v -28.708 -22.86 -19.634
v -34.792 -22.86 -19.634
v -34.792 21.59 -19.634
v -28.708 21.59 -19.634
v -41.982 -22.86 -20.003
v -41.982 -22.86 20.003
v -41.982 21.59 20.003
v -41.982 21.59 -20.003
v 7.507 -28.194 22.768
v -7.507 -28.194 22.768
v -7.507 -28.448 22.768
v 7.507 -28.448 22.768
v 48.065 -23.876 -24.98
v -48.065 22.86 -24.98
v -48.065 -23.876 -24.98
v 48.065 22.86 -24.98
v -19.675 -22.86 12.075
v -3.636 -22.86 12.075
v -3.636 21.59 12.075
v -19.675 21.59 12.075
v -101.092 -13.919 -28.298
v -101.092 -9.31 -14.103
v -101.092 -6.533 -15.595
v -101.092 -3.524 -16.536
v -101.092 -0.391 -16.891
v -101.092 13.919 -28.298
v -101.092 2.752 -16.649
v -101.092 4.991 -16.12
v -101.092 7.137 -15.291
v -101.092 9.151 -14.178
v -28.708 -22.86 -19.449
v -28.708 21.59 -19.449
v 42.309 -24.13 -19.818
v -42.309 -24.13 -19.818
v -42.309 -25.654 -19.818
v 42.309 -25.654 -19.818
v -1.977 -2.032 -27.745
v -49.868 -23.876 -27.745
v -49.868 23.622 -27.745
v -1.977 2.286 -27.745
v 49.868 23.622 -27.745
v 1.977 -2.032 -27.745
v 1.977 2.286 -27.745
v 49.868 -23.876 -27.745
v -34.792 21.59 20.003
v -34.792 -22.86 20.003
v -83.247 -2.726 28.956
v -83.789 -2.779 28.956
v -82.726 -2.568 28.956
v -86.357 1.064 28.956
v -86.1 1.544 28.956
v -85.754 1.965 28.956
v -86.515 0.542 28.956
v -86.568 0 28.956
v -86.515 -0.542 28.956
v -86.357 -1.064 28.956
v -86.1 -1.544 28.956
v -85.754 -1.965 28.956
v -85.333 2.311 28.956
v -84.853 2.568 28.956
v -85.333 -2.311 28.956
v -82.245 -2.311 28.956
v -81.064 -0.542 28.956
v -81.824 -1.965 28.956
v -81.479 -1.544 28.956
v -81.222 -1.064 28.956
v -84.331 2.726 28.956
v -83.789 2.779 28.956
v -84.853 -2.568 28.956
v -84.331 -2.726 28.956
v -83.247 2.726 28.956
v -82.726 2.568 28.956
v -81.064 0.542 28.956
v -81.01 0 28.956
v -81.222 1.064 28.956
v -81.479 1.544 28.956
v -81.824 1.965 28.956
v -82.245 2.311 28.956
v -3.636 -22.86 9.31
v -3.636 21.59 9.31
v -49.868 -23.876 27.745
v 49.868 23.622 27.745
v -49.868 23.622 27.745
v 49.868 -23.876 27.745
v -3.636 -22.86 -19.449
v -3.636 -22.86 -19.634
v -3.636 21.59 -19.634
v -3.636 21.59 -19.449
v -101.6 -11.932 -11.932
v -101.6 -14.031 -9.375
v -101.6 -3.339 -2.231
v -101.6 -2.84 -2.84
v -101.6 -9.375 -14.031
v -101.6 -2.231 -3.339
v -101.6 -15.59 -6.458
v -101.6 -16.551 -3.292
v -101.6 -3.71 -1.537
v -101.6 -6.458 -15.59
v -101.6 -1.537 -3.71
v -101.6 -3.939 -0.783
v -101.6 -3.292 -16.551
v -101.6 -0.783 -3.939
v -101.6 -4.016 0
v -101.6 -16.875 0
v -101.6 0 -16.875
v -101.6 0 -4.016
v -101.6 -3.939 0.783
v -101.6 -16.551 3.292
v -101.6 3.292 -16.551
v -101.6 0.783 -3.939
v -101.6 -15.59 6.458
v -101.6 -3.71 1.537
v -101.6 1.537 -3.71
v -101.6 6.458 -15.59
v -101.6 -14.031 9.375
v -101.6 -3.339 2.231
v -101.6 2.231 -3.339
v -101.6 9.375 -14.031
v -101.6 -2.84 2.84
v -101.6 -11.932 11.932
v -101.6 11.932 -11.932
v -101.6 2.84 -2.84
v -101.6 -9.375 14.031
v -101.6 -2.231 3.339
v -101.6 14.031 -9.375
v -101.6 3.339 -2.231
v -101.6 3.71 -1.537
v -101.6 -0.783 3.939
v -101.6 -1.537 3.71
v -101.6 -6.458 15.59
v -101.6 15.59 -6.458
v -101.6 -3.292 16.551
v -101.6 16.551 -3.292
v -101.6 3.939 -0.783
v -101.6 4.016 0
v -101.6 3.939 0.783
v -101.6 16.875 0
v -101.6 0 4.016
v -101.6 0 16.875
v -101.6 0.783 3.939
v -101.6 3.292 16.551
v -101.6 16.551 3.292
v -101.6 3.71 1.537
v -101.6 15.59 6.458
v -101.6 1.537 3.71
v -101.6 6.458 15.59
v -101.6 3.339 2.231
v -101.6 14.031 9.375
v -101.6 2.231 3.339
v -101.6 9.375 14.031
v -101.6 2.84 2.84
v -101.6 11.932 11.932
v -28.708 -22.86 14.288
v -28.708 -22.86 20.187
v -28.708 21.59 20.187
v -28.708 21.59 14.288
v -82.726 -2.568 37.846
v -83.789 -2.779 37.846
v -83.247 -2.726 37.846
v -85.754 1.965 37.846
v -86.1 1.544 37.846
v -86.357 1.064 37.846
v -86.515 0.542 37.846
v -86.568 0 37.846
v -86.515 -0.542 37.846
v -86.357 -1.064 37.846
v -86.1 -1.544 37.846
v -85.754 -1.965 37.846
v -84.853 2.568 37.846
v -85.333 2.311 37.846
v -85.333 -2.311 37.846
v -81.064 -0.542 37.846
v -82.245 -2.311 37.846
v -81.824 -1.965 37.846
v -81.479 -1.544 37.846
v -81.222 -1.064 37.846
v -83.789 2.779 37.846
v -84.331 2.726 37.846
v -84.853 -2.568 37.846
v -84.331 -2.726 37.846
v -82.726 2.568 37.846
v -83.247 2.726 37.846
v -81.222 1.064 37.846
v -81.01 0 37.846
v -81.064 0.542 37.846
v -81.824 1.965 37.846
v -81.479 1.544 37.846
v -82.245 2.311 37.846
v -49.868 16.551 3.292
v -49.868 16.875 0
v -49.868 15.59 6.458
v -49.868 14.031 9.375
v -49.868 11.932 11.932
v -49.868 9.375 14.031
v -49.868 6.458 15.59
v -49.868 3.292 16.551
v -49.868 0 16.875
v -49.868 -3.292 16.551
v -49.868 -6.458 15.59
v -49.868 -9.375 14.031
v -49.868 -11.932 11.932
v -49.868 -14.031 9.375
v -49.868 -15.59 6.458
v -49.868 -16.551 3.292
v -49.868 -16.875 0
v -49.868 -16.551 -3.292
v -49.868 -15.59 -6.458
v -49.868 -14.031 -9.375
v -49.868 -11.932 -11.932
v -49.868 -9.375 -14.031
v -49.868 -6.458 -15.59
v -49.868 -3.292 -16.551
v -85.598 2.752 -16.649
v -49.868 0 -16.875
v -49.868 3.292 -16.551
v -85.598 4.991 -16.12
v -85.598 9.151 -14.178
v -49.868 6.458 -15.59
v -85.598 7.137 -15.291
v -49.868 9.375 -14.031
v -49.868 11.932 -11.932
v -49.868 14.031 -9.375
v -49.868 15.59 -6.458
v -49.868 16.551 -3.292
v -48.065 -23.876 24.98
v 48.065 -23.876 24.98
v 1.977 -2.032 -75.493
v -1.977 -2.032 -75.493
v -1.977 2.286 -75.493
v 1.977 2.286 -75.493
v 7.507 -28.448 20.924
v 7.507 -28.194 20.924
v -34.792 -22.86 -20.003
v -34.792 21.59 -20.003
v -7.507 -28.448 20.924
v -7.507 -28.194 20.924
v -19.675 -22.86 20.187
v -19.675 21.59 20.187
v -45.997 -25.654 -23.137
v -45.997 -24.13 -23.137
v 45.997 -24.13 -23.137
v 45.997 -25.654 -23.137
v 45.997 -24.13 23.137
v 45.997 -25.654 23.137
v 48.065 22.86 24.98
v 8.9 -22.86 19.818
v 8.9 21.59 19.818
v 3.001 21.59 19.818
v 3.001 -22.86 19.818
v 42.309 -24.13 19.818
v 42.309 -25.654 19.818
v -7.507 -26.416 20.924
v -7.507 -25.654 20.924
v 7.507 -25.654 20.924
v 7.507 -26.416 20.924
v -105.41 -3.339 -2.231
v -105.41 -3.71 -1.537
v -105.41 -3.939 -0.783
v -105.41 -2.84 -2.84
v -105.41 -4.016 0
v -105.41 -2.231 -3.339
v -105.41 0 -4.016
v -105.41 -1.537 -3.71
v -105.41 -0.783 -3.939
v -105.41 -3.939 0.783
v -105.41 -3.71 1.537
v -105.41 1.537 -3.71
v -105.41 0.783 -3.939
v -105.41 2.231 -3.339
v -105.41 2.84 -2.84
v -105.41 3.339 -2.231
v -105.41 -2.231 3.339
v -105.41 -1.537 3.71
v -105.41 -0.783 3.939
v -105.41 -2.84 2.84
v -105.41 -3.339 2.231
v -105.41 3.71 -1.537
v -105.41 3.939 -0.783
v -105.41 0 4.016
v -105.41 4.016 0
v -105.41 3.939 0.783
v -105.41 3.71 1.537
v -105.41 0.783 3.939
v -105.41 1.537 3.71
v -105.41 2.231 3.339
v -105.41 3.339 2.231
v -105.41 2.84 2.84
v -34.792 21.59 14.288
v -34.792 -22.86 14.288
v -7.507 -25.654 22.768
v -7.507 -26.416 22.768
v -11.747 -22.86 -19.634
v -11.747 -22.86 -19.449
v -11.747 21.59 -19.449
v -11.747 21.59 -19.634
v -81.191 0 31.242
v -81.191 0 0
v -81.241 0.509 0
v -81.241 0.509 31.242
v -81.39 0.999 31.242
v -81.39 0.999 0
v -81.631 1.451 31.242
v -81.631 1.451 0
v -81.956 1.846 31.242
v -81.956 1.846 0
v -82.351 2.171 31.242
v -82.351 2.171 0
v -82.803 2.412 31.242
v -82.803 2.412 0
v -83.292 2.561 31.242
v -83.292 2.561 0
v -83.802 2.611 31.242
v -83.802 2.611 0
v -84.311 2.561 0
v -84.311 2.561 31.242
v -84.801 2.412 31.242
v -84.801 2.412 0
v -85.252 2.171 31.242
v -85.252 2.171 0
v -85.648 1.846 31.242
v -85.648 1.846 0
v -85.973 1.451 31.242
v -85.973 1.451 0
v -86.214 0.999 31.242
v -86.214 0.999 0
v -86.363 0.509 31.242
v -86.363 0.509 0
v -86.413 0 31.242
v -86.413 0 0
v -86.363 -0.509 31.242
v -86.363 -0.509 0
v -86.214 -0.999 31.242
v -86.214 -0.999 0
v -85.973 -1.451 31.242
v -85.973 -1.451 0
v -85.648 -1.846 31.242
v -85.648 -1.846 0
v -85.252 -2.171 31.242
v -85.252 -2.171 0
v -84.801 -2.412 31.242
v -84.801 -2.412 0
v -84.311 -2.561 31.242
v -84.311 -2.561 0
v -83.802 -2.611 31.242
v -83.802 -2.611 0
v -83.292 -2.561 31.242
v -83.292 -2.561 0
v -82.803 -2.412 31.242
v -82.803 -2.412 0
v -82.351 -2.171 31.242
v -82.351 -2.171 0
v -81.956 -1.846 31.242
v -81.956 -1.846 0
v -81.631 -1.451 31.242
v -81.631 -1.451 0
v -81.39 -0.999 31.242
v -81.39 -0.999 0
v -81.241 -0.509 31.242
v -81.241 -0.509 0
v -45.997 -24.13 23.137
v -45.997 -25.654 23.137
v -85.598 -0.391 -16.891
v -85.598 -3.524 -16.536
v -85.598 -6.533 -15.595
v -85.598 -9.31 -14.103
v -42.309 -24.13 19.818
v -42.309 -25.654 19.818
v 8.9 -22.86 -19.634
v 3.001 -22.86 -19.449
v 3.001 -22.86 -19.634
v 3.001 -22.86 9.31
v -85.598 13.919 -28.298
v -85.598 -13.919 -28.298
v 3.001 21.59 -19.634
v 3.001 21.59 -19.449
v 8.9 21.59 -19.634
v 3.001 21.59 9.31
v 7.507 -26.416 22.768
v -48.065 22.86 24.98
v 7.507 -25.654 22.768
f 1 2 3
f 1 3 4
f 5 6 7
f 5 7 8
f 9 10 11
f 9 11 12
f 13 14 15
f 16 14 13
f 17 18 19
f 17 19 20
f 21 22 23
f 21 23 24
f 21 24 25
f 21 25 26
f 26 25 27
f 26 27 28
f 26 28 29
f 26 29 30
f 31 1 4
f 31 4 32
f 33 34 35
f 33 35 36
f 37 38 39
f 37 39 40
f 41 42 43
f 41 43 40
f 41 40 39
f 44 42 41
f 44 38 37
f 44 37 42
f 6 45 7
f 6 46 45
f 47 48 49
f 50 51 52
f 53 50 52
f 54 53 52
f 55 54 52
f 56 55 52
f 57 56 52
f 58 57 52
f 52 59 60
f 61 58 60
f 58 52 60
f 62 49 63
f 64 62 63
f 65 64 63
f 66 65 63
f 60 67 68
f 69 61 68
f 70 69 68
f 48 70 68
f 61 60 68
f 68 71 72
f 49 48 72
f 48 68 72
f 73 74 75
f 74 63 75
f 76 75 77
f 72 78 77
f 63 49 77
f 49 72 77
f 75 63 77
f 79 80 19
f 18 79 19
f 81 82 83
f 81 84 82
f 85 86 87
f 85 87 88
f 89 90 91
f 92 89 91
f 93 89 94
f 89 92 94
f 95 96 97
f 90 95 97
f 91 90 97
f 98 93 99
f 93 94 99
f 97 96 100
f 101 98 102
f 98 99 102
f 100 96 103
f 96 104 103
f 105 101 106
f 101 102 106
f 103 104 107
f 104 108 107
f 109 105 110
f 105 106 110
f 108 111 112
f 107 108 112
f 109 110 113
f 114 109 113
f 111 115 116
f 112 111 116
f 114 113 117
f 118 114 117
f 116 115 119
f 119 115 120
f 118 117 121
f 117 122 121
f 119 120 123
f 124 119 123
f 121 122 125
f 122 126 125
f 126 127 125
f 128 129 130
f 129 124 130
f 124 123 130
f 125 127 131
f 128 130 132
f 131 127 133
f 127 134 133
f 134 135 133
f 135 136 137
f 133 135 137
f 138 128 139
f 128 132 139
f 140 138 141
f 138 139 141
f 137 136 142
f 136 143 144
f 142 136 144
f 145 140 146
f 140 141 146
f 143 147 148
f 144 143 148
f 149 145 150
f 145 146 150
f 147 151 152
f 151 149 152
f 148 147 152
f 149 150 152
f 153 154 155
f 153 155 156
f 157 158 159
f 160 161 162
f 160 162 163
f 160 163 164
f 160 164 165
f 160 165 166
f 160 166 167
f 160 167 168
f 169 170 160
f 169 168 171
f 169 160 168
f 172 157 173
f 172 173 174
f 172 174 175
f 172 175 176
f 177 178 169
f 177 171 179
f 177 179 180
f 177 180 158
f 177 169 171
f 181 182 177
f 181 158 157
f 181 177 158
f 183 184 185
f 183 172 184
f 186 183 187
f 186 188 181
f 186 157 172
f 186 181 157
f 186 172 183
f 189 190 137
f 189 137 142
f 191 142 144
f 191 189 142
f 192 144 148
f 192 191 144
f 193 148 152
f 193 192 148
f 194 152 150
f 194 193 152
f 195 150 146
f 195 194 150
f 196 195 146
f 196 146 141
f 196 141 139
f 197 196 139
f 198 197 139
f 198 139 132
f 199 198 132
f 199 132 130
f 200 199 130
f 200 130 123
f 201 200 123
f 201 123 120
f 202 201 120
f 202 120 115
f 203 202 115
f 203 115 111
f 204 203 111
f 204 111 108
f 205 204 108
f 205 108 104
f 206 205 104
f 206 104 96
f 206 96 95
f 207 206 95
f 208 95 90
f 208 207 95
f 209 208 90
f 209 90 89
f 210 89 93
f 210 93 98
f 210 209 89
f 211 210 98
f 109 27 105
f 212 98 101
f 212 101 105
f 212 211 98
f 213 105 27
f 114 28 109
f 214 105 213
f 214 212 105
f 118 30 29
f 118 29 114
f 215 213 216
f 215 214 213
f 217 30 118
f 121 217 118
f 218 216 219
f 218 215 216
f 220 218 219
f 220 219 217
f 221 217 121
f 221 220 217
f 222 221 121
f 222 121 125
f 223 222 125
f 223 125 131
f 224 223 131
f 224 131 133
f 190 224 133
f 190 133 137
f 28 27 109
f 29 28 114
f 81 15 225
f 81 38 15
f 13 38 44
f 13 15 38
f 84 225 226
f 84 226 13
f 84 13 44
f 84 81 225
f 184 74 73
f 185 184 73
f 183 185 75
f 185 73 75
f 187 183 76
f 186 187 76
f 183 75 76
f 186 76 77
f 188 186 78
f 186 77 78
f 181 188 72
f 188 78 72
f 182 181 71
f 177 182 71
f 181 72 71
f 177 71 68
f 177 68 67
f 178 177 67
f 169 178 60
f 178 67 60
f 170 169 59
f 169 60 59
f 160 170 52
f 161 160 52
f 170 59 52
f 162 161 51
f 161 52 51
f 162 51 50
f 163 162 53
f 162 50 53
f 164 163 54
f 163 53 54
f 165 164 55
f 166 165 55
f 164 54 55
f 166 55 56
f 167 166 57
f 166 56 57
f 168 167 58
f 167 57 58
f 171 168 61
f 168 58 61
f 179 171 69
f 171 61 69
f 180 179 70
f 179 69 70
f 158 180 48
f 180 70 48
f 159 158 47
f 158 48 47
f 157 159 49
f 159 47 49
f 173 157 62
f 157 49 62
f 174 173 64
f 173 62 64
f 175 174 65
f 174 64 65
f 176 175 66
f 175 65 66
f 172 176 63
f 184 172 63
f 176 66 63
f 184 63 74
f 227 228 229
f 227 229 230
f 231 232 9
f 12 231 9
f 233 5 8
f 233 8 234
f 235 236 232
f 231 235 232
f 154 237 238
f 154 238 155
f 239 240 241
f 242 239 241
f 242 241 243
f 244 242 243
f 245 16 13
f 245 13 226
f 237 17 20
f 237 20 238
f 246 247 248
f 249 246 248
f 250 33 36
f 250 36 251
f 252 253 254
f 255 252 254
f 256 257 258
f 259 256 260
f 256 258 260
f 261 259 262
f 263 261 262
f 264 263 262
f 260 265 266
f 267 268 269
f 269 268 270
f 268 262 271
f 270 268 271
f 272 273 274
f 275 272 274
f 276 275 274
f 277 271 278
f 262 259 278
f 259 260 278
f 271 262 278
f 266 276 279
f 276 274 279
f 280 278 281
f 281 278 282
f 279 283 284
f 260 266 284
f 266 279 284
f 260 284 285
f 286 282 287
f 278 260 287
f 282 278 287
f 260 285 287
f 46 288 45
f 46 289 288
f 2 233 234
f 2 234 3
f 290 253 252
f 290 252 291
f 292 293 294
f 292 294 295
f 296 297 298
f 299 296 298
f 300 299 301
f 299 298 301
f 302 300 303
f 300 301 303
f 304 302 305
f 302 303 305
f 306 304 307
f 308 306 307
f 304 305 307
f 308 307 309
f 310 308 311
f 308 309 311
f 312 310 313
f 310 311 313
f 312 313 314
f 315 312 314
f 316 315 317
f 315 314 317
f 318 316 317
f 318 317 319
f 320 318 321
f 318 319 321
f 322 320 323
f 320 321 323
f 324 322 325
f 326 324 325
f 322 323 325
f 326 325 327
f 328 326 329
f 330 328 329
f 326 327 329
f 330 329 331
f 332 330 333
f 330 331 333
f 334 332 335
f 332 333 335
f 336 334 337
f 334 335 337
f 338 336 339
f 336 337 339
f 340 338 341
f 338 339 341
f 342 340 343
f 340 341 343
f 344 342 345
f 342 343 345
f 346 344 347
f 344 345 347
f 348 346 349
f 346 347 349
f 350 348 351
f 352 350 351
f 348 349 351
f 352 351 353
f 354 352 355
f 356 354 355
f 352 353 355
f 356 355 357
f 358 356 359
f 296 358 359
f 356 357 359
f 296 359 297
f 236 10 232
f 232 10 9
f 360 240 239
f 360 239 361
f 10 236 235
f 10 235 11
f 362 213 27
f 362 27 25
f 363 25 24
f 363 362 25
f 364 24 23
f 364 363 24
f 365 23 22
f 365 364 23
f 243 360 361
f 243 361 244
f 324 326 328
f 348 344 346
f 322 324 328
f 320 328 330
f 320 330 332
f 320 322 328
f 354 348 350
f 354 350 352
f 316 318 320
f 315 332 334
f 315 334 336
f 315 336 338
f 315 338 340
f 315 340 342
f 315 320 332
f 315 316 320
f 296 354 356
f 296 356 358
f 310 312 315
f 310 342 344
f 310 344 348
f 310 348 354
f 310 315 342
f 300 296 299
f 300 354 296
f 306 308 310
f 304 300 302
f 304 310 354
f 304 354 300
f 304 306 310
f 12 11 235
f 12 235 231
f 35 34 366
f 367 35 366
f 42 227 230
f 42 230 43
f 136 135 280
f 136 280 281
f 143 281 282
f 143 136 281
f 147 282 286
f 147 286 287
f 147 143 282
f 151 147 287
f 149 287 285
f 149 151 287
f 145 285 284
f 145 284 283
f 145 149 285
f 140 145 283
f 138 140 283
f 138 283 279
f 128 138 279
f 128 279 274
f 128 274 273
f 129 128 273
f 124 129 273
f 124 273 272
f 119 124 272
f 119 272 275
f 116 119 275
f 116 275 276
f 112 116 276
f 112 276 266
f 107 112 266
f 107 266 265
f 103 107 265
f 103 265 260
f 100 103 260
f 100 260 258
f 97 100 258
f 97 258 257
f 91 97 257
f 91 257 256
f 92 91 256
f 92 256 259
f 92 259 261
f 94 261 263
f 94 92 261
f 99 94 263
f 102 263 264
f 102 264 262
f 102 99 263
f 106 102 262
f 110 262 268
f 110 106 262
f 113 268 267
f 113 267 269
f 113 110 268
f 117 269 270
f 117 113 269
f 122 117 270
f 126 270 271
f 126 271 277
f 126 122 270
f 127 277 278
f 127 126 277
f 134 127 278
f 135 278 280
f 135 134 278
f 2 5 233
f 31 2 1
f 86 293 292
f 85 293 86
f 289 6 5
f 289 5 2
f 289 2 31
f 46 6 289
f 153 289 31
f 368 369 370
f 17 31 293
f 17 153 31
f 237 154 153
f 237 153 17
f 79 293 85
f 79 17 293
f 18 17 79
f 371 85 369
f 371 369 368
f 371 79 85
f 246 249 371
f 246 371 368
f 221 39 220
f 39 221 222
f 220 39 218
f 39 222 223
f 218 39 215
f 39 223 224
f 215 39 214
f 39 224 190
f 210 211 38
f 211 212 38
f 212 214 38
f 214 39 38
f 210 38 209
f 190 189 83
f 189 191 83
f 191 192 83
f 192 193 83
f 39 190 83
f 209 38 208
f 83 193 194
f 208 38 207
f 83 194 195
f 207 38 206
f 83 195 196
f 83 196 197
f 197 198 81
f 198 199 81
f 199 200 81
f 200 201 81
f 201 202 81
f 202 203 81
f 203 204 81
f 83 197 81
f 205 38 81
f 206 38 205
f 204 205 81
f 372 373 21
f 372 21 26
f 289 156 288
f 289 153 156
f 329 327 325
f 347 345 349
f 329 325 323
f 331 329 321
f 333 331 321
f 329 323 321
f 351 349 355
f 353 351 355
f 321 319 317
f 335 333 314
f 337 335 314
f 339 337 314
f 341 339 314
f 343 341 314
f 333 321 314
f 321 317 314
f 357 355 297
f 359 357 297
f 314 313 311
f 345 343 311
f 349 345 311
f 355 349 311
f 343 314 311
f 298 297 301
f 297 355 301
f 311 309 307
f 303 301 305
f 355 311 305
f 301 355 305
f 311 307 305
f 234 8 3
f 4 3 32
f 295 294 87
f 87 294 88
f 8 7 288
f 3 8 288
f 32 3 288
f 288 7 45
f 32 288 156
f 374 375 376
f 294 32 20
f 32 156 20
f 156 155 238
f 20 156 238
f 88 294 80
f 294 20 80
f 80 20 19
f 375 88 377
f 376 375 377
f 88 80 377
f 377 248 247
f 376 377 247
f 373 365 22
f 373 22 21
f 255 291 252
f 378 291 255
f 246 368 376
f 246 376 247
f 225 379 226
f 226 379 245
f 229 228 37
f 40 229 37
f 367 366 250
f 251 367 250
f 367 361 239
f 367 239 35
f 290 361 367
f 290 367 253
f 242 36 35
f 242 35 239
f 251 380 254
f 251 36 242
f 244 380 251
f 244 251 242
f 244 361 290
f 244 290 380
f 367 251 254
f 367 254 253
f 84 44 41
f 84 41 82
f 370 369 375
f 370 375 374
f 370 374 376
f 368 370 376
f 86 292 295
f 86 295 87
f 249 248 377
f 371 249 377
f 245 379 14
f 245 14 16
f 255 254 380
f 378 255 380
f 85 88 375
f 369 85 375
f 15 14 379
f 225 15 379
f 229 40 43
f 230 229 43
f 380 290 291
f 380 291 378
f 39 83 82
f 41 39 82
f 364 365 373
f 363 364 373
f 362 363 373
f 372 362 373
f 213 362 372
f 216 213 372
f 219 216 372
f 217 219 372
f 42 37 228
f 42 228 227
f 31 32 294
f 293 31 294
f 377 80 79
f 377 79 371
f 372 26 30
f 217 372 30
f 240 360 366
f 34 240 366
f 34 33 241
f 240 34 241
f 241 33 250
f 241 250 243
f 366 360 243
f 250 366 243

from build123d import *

# Parameters (mm, degrees)
F7_START       = -49.784
F3_R           = 4.0158055206
F7_DEPTH       = 55.626
F8_START       = -49.784
F2_R           = 16.8747634717
F8_DEPTH       = 51.816
F9_START       = -85.598
F9_DEPTH       = 15.494
F10_START      = 28.956
F5_R           = 2.7791124711
F10_DEPTH      = 8.89
F6_R           = 2.6110689317
F11_DEPTH      = 31.242
F0_W           = 49.8679839075
F0_H           = 55.4908066988
F12_DEPTH      = 23.876
F12_DEPTH_BACK = 23.622
F1_W           = 91.9930636883
F1_H           = 46.2730638683
F1_W_2         = 84.6188738942
F1_H_2         = 39.6362915635
F13_DEPTH      = 25.654
F14_W          = 96.130810678
F14_H          = 49.9601624906
F15_DEPTH      = 22.86
F15_DEPTH_BACK = 24.13
F17_START      = 24.638
F16_W          = 15.0146773085
F16_H          = 1.8435493112
F17_DEPTH      = 3.81
F19_START      = 26.416
F18_W          = 15.3833860531
F18_H          = 2.2122561932
F19_DEPTH      = 1.778
F20_W          = 3.9533865638
F20_H          = 47.9322560132
F21_DEPTH      = 2.032
F21_DEPTH_BACK = 2.286
F22_W          = 7.9272594303
F22_H          = 31.5246768296
F22_W_2        = 6.6367732361
F22_H_2        = 28.7593547255
F23_DEPTH      = 22.86
F23_DEPTH_BACK = 21.59


with BuildPart() as f7:
    # F3 (on Right) → F7 (new body)
    with BuildSketch(Plane.YZ.offset(F7_START)):
        Circle(F3_R)
    extrude(amount=-F7_DEPTH)

    # F2 (on Right) → F8 (join)
    with BuildSketch(Plane.YZ.offset(F8_START)):
        Circle(F2_R)
    extrude(amount=-F8_DEPTH)

    # F4 (on Right) → F9 (join)
    with BuildSketch(Plane.YZ.offset(F9_START)):
        with BuildLine():
            Line((13.9187918976, -28.2984673977), (9.1255651787, -14.1031453386))
            ThreePointArc((9.1255651787, -14.1031453386), (-0.0921771862, -16.89405352), (-9.309919551, -14.1031453386))
            Line((-9.309919551, -14.1031453386), (-13.9187891036, -28.2984673977))
            Line((-13.9187891036, -28.2984673977), (0, -28.2984673977))
            Line((0, -28.2984673977), (13.9187918976, -28.2984673977))
        make_face()
    extrude(amount=-F9_DEPTH)

    # F0 (on Front) → F12 (join, two sides)
    with BuildSketch(Plane.XZ) as f12_sk:
        with Locations((-24.9339919537, 0)):
            Rectangle(F0_W, F0_H)
        with Locations((24.9339919537, 0)):
            Rectangle(F0_W, F0_H)
    extrude(amount=F12_DEPTH)
    extrude(f12_sk.sketch, amount=-F12_DEPTH_BACK)

    # F1 (on Front) → F13 (join)
    with BuildSketch(Plane.XZ):
        Rectangle(F1_W, F1_H)
        Rectangle(F1_W_2, F1_H_2, mode=Mode.SUBTRACT)
    extrude(amount=F13_DEPTH)

    # F14 (on Front) → F15 (cut, two sides)
    with BuildSketch(Plane.XZ) as f15_sk:
        Rectangle(F14_W, F14_H)
    extrude(amount=-F15_DEPTH, mode=Mode.SUBTRACT)
    extrude(f15_sk.sketch, amount=F15_DEPTH_BACK, mode=Mode.SUBTRACT)

    # F16 (on Front) → F17 (join)
    with BuildSketch(Plane.XZ.offset(F17_START)):
        with Locations((0, 21.8460503966)):
            Rectangle(F16_W, F16_H)
    extrude(amount=F17_DEPTH)

    # F18 (on Front) → F19 (cut)
    with BuildSketch(Plane.XZ.offset(F19_START)):
        with Locations((0, 21.8460503966)):
            Rectangle(F18_W, F18_H)
    extrude(amount=F19_DEPTH, mode=Mode.SUBTRACT)

    # F20 (on Front) → F21 (join, two sides)
    with BuildSketch(Plane.XZ) as f21_sk:
        with Locations((0, -51.527177915)):
            Rectangle(F20_W, F20_H)
    extrude(amount=F21_DEPTH)
    extrude(f21_sk.sketch, amount=-F21_DEPTH_BACK)


with BuildPart() as f10:
    # F5 (on Top) → F10 (new body)
    with BuildSketch(Plane.XY.offset(F10_START)):
        with Locations((-83.7892740965, 0)):
            Circle(F5_R)
    extrude(amount=F10_DEPTH)


with BuildPart() as f11:
    # F6 (on Top) → F11 (new body)
    with BuildSketch(Plane.XY):
        with Locations((-83.8018581271, 0)):
            Circle(F6_R)
    extrude(amount=F11_DEPTH)


with BuildPart() as f23:
    # F22 (on Front) → F23 (new body, two sides)
    with BuildSketch(Plane.XZ) as f23_sk:
        Polygon((-34.7918570042, 20.0025010854), (-41.9816933572, 20.0025010854), (-41.9816933572, -20.0025010854), (-34.7918570042, -20.0025010854), (-34.7918570042, -19.6337904781), (-34.7918570042, 14.2875006422), align=None)
        Polygon((-28.7081450224, 14.2875006422), (-34.7918570042, 14.2875006422), (-34.7918570042, -19.6337904781), (-28.7081450224, -19.6337904781), (-28.7081450224, -19.4494351745), align=None)
        Polygon((-28.7081450224, 20.1868545264), (-28.7081450224, 14.2875006422), (-28.7081450224, -19.4494351745), (-19.6747593582, -19.4494351745), (-19.6747593582, 12.0752416551), (-19.6747593582, 20.1868545264), align=None)
        with Locations((-15.711129643, -3.6870967597)):
            Rectangle(F22_W, F22_H)
        Polygon((-11.7474999279, 12.0752416551), (-11.7474999279, -19.4494351745), (-11.7474999279, -19.6337904781), (-3.6358870566, -19.6337904781), (-3.6358870566, -19.4494351745), (-3.6358870566, 9.309919551), (-3.6358870566, 12.0752416551), align=None)
        with Locations((-0.3175004385, -5.0697578117)):
            Rectangle(F22_W_2, F22_H_2)
        Polygon((3.0008861795, 19.8181457818), (3.0008861795, 9.309919551), (3.0008861795, -19.4494351745), (3.0008861795, -19.6337904781), (8.900240995, -19.6337904781), (8.900240995, 19.8181457818), align=None)
    extrude(amount=F23_DEPTH)
    extrude(f23_sk.sketch, amount=-F23_DEPTH_BACK)


solid = Compound([f7.part, f10.part, f11.part, f23.part])
